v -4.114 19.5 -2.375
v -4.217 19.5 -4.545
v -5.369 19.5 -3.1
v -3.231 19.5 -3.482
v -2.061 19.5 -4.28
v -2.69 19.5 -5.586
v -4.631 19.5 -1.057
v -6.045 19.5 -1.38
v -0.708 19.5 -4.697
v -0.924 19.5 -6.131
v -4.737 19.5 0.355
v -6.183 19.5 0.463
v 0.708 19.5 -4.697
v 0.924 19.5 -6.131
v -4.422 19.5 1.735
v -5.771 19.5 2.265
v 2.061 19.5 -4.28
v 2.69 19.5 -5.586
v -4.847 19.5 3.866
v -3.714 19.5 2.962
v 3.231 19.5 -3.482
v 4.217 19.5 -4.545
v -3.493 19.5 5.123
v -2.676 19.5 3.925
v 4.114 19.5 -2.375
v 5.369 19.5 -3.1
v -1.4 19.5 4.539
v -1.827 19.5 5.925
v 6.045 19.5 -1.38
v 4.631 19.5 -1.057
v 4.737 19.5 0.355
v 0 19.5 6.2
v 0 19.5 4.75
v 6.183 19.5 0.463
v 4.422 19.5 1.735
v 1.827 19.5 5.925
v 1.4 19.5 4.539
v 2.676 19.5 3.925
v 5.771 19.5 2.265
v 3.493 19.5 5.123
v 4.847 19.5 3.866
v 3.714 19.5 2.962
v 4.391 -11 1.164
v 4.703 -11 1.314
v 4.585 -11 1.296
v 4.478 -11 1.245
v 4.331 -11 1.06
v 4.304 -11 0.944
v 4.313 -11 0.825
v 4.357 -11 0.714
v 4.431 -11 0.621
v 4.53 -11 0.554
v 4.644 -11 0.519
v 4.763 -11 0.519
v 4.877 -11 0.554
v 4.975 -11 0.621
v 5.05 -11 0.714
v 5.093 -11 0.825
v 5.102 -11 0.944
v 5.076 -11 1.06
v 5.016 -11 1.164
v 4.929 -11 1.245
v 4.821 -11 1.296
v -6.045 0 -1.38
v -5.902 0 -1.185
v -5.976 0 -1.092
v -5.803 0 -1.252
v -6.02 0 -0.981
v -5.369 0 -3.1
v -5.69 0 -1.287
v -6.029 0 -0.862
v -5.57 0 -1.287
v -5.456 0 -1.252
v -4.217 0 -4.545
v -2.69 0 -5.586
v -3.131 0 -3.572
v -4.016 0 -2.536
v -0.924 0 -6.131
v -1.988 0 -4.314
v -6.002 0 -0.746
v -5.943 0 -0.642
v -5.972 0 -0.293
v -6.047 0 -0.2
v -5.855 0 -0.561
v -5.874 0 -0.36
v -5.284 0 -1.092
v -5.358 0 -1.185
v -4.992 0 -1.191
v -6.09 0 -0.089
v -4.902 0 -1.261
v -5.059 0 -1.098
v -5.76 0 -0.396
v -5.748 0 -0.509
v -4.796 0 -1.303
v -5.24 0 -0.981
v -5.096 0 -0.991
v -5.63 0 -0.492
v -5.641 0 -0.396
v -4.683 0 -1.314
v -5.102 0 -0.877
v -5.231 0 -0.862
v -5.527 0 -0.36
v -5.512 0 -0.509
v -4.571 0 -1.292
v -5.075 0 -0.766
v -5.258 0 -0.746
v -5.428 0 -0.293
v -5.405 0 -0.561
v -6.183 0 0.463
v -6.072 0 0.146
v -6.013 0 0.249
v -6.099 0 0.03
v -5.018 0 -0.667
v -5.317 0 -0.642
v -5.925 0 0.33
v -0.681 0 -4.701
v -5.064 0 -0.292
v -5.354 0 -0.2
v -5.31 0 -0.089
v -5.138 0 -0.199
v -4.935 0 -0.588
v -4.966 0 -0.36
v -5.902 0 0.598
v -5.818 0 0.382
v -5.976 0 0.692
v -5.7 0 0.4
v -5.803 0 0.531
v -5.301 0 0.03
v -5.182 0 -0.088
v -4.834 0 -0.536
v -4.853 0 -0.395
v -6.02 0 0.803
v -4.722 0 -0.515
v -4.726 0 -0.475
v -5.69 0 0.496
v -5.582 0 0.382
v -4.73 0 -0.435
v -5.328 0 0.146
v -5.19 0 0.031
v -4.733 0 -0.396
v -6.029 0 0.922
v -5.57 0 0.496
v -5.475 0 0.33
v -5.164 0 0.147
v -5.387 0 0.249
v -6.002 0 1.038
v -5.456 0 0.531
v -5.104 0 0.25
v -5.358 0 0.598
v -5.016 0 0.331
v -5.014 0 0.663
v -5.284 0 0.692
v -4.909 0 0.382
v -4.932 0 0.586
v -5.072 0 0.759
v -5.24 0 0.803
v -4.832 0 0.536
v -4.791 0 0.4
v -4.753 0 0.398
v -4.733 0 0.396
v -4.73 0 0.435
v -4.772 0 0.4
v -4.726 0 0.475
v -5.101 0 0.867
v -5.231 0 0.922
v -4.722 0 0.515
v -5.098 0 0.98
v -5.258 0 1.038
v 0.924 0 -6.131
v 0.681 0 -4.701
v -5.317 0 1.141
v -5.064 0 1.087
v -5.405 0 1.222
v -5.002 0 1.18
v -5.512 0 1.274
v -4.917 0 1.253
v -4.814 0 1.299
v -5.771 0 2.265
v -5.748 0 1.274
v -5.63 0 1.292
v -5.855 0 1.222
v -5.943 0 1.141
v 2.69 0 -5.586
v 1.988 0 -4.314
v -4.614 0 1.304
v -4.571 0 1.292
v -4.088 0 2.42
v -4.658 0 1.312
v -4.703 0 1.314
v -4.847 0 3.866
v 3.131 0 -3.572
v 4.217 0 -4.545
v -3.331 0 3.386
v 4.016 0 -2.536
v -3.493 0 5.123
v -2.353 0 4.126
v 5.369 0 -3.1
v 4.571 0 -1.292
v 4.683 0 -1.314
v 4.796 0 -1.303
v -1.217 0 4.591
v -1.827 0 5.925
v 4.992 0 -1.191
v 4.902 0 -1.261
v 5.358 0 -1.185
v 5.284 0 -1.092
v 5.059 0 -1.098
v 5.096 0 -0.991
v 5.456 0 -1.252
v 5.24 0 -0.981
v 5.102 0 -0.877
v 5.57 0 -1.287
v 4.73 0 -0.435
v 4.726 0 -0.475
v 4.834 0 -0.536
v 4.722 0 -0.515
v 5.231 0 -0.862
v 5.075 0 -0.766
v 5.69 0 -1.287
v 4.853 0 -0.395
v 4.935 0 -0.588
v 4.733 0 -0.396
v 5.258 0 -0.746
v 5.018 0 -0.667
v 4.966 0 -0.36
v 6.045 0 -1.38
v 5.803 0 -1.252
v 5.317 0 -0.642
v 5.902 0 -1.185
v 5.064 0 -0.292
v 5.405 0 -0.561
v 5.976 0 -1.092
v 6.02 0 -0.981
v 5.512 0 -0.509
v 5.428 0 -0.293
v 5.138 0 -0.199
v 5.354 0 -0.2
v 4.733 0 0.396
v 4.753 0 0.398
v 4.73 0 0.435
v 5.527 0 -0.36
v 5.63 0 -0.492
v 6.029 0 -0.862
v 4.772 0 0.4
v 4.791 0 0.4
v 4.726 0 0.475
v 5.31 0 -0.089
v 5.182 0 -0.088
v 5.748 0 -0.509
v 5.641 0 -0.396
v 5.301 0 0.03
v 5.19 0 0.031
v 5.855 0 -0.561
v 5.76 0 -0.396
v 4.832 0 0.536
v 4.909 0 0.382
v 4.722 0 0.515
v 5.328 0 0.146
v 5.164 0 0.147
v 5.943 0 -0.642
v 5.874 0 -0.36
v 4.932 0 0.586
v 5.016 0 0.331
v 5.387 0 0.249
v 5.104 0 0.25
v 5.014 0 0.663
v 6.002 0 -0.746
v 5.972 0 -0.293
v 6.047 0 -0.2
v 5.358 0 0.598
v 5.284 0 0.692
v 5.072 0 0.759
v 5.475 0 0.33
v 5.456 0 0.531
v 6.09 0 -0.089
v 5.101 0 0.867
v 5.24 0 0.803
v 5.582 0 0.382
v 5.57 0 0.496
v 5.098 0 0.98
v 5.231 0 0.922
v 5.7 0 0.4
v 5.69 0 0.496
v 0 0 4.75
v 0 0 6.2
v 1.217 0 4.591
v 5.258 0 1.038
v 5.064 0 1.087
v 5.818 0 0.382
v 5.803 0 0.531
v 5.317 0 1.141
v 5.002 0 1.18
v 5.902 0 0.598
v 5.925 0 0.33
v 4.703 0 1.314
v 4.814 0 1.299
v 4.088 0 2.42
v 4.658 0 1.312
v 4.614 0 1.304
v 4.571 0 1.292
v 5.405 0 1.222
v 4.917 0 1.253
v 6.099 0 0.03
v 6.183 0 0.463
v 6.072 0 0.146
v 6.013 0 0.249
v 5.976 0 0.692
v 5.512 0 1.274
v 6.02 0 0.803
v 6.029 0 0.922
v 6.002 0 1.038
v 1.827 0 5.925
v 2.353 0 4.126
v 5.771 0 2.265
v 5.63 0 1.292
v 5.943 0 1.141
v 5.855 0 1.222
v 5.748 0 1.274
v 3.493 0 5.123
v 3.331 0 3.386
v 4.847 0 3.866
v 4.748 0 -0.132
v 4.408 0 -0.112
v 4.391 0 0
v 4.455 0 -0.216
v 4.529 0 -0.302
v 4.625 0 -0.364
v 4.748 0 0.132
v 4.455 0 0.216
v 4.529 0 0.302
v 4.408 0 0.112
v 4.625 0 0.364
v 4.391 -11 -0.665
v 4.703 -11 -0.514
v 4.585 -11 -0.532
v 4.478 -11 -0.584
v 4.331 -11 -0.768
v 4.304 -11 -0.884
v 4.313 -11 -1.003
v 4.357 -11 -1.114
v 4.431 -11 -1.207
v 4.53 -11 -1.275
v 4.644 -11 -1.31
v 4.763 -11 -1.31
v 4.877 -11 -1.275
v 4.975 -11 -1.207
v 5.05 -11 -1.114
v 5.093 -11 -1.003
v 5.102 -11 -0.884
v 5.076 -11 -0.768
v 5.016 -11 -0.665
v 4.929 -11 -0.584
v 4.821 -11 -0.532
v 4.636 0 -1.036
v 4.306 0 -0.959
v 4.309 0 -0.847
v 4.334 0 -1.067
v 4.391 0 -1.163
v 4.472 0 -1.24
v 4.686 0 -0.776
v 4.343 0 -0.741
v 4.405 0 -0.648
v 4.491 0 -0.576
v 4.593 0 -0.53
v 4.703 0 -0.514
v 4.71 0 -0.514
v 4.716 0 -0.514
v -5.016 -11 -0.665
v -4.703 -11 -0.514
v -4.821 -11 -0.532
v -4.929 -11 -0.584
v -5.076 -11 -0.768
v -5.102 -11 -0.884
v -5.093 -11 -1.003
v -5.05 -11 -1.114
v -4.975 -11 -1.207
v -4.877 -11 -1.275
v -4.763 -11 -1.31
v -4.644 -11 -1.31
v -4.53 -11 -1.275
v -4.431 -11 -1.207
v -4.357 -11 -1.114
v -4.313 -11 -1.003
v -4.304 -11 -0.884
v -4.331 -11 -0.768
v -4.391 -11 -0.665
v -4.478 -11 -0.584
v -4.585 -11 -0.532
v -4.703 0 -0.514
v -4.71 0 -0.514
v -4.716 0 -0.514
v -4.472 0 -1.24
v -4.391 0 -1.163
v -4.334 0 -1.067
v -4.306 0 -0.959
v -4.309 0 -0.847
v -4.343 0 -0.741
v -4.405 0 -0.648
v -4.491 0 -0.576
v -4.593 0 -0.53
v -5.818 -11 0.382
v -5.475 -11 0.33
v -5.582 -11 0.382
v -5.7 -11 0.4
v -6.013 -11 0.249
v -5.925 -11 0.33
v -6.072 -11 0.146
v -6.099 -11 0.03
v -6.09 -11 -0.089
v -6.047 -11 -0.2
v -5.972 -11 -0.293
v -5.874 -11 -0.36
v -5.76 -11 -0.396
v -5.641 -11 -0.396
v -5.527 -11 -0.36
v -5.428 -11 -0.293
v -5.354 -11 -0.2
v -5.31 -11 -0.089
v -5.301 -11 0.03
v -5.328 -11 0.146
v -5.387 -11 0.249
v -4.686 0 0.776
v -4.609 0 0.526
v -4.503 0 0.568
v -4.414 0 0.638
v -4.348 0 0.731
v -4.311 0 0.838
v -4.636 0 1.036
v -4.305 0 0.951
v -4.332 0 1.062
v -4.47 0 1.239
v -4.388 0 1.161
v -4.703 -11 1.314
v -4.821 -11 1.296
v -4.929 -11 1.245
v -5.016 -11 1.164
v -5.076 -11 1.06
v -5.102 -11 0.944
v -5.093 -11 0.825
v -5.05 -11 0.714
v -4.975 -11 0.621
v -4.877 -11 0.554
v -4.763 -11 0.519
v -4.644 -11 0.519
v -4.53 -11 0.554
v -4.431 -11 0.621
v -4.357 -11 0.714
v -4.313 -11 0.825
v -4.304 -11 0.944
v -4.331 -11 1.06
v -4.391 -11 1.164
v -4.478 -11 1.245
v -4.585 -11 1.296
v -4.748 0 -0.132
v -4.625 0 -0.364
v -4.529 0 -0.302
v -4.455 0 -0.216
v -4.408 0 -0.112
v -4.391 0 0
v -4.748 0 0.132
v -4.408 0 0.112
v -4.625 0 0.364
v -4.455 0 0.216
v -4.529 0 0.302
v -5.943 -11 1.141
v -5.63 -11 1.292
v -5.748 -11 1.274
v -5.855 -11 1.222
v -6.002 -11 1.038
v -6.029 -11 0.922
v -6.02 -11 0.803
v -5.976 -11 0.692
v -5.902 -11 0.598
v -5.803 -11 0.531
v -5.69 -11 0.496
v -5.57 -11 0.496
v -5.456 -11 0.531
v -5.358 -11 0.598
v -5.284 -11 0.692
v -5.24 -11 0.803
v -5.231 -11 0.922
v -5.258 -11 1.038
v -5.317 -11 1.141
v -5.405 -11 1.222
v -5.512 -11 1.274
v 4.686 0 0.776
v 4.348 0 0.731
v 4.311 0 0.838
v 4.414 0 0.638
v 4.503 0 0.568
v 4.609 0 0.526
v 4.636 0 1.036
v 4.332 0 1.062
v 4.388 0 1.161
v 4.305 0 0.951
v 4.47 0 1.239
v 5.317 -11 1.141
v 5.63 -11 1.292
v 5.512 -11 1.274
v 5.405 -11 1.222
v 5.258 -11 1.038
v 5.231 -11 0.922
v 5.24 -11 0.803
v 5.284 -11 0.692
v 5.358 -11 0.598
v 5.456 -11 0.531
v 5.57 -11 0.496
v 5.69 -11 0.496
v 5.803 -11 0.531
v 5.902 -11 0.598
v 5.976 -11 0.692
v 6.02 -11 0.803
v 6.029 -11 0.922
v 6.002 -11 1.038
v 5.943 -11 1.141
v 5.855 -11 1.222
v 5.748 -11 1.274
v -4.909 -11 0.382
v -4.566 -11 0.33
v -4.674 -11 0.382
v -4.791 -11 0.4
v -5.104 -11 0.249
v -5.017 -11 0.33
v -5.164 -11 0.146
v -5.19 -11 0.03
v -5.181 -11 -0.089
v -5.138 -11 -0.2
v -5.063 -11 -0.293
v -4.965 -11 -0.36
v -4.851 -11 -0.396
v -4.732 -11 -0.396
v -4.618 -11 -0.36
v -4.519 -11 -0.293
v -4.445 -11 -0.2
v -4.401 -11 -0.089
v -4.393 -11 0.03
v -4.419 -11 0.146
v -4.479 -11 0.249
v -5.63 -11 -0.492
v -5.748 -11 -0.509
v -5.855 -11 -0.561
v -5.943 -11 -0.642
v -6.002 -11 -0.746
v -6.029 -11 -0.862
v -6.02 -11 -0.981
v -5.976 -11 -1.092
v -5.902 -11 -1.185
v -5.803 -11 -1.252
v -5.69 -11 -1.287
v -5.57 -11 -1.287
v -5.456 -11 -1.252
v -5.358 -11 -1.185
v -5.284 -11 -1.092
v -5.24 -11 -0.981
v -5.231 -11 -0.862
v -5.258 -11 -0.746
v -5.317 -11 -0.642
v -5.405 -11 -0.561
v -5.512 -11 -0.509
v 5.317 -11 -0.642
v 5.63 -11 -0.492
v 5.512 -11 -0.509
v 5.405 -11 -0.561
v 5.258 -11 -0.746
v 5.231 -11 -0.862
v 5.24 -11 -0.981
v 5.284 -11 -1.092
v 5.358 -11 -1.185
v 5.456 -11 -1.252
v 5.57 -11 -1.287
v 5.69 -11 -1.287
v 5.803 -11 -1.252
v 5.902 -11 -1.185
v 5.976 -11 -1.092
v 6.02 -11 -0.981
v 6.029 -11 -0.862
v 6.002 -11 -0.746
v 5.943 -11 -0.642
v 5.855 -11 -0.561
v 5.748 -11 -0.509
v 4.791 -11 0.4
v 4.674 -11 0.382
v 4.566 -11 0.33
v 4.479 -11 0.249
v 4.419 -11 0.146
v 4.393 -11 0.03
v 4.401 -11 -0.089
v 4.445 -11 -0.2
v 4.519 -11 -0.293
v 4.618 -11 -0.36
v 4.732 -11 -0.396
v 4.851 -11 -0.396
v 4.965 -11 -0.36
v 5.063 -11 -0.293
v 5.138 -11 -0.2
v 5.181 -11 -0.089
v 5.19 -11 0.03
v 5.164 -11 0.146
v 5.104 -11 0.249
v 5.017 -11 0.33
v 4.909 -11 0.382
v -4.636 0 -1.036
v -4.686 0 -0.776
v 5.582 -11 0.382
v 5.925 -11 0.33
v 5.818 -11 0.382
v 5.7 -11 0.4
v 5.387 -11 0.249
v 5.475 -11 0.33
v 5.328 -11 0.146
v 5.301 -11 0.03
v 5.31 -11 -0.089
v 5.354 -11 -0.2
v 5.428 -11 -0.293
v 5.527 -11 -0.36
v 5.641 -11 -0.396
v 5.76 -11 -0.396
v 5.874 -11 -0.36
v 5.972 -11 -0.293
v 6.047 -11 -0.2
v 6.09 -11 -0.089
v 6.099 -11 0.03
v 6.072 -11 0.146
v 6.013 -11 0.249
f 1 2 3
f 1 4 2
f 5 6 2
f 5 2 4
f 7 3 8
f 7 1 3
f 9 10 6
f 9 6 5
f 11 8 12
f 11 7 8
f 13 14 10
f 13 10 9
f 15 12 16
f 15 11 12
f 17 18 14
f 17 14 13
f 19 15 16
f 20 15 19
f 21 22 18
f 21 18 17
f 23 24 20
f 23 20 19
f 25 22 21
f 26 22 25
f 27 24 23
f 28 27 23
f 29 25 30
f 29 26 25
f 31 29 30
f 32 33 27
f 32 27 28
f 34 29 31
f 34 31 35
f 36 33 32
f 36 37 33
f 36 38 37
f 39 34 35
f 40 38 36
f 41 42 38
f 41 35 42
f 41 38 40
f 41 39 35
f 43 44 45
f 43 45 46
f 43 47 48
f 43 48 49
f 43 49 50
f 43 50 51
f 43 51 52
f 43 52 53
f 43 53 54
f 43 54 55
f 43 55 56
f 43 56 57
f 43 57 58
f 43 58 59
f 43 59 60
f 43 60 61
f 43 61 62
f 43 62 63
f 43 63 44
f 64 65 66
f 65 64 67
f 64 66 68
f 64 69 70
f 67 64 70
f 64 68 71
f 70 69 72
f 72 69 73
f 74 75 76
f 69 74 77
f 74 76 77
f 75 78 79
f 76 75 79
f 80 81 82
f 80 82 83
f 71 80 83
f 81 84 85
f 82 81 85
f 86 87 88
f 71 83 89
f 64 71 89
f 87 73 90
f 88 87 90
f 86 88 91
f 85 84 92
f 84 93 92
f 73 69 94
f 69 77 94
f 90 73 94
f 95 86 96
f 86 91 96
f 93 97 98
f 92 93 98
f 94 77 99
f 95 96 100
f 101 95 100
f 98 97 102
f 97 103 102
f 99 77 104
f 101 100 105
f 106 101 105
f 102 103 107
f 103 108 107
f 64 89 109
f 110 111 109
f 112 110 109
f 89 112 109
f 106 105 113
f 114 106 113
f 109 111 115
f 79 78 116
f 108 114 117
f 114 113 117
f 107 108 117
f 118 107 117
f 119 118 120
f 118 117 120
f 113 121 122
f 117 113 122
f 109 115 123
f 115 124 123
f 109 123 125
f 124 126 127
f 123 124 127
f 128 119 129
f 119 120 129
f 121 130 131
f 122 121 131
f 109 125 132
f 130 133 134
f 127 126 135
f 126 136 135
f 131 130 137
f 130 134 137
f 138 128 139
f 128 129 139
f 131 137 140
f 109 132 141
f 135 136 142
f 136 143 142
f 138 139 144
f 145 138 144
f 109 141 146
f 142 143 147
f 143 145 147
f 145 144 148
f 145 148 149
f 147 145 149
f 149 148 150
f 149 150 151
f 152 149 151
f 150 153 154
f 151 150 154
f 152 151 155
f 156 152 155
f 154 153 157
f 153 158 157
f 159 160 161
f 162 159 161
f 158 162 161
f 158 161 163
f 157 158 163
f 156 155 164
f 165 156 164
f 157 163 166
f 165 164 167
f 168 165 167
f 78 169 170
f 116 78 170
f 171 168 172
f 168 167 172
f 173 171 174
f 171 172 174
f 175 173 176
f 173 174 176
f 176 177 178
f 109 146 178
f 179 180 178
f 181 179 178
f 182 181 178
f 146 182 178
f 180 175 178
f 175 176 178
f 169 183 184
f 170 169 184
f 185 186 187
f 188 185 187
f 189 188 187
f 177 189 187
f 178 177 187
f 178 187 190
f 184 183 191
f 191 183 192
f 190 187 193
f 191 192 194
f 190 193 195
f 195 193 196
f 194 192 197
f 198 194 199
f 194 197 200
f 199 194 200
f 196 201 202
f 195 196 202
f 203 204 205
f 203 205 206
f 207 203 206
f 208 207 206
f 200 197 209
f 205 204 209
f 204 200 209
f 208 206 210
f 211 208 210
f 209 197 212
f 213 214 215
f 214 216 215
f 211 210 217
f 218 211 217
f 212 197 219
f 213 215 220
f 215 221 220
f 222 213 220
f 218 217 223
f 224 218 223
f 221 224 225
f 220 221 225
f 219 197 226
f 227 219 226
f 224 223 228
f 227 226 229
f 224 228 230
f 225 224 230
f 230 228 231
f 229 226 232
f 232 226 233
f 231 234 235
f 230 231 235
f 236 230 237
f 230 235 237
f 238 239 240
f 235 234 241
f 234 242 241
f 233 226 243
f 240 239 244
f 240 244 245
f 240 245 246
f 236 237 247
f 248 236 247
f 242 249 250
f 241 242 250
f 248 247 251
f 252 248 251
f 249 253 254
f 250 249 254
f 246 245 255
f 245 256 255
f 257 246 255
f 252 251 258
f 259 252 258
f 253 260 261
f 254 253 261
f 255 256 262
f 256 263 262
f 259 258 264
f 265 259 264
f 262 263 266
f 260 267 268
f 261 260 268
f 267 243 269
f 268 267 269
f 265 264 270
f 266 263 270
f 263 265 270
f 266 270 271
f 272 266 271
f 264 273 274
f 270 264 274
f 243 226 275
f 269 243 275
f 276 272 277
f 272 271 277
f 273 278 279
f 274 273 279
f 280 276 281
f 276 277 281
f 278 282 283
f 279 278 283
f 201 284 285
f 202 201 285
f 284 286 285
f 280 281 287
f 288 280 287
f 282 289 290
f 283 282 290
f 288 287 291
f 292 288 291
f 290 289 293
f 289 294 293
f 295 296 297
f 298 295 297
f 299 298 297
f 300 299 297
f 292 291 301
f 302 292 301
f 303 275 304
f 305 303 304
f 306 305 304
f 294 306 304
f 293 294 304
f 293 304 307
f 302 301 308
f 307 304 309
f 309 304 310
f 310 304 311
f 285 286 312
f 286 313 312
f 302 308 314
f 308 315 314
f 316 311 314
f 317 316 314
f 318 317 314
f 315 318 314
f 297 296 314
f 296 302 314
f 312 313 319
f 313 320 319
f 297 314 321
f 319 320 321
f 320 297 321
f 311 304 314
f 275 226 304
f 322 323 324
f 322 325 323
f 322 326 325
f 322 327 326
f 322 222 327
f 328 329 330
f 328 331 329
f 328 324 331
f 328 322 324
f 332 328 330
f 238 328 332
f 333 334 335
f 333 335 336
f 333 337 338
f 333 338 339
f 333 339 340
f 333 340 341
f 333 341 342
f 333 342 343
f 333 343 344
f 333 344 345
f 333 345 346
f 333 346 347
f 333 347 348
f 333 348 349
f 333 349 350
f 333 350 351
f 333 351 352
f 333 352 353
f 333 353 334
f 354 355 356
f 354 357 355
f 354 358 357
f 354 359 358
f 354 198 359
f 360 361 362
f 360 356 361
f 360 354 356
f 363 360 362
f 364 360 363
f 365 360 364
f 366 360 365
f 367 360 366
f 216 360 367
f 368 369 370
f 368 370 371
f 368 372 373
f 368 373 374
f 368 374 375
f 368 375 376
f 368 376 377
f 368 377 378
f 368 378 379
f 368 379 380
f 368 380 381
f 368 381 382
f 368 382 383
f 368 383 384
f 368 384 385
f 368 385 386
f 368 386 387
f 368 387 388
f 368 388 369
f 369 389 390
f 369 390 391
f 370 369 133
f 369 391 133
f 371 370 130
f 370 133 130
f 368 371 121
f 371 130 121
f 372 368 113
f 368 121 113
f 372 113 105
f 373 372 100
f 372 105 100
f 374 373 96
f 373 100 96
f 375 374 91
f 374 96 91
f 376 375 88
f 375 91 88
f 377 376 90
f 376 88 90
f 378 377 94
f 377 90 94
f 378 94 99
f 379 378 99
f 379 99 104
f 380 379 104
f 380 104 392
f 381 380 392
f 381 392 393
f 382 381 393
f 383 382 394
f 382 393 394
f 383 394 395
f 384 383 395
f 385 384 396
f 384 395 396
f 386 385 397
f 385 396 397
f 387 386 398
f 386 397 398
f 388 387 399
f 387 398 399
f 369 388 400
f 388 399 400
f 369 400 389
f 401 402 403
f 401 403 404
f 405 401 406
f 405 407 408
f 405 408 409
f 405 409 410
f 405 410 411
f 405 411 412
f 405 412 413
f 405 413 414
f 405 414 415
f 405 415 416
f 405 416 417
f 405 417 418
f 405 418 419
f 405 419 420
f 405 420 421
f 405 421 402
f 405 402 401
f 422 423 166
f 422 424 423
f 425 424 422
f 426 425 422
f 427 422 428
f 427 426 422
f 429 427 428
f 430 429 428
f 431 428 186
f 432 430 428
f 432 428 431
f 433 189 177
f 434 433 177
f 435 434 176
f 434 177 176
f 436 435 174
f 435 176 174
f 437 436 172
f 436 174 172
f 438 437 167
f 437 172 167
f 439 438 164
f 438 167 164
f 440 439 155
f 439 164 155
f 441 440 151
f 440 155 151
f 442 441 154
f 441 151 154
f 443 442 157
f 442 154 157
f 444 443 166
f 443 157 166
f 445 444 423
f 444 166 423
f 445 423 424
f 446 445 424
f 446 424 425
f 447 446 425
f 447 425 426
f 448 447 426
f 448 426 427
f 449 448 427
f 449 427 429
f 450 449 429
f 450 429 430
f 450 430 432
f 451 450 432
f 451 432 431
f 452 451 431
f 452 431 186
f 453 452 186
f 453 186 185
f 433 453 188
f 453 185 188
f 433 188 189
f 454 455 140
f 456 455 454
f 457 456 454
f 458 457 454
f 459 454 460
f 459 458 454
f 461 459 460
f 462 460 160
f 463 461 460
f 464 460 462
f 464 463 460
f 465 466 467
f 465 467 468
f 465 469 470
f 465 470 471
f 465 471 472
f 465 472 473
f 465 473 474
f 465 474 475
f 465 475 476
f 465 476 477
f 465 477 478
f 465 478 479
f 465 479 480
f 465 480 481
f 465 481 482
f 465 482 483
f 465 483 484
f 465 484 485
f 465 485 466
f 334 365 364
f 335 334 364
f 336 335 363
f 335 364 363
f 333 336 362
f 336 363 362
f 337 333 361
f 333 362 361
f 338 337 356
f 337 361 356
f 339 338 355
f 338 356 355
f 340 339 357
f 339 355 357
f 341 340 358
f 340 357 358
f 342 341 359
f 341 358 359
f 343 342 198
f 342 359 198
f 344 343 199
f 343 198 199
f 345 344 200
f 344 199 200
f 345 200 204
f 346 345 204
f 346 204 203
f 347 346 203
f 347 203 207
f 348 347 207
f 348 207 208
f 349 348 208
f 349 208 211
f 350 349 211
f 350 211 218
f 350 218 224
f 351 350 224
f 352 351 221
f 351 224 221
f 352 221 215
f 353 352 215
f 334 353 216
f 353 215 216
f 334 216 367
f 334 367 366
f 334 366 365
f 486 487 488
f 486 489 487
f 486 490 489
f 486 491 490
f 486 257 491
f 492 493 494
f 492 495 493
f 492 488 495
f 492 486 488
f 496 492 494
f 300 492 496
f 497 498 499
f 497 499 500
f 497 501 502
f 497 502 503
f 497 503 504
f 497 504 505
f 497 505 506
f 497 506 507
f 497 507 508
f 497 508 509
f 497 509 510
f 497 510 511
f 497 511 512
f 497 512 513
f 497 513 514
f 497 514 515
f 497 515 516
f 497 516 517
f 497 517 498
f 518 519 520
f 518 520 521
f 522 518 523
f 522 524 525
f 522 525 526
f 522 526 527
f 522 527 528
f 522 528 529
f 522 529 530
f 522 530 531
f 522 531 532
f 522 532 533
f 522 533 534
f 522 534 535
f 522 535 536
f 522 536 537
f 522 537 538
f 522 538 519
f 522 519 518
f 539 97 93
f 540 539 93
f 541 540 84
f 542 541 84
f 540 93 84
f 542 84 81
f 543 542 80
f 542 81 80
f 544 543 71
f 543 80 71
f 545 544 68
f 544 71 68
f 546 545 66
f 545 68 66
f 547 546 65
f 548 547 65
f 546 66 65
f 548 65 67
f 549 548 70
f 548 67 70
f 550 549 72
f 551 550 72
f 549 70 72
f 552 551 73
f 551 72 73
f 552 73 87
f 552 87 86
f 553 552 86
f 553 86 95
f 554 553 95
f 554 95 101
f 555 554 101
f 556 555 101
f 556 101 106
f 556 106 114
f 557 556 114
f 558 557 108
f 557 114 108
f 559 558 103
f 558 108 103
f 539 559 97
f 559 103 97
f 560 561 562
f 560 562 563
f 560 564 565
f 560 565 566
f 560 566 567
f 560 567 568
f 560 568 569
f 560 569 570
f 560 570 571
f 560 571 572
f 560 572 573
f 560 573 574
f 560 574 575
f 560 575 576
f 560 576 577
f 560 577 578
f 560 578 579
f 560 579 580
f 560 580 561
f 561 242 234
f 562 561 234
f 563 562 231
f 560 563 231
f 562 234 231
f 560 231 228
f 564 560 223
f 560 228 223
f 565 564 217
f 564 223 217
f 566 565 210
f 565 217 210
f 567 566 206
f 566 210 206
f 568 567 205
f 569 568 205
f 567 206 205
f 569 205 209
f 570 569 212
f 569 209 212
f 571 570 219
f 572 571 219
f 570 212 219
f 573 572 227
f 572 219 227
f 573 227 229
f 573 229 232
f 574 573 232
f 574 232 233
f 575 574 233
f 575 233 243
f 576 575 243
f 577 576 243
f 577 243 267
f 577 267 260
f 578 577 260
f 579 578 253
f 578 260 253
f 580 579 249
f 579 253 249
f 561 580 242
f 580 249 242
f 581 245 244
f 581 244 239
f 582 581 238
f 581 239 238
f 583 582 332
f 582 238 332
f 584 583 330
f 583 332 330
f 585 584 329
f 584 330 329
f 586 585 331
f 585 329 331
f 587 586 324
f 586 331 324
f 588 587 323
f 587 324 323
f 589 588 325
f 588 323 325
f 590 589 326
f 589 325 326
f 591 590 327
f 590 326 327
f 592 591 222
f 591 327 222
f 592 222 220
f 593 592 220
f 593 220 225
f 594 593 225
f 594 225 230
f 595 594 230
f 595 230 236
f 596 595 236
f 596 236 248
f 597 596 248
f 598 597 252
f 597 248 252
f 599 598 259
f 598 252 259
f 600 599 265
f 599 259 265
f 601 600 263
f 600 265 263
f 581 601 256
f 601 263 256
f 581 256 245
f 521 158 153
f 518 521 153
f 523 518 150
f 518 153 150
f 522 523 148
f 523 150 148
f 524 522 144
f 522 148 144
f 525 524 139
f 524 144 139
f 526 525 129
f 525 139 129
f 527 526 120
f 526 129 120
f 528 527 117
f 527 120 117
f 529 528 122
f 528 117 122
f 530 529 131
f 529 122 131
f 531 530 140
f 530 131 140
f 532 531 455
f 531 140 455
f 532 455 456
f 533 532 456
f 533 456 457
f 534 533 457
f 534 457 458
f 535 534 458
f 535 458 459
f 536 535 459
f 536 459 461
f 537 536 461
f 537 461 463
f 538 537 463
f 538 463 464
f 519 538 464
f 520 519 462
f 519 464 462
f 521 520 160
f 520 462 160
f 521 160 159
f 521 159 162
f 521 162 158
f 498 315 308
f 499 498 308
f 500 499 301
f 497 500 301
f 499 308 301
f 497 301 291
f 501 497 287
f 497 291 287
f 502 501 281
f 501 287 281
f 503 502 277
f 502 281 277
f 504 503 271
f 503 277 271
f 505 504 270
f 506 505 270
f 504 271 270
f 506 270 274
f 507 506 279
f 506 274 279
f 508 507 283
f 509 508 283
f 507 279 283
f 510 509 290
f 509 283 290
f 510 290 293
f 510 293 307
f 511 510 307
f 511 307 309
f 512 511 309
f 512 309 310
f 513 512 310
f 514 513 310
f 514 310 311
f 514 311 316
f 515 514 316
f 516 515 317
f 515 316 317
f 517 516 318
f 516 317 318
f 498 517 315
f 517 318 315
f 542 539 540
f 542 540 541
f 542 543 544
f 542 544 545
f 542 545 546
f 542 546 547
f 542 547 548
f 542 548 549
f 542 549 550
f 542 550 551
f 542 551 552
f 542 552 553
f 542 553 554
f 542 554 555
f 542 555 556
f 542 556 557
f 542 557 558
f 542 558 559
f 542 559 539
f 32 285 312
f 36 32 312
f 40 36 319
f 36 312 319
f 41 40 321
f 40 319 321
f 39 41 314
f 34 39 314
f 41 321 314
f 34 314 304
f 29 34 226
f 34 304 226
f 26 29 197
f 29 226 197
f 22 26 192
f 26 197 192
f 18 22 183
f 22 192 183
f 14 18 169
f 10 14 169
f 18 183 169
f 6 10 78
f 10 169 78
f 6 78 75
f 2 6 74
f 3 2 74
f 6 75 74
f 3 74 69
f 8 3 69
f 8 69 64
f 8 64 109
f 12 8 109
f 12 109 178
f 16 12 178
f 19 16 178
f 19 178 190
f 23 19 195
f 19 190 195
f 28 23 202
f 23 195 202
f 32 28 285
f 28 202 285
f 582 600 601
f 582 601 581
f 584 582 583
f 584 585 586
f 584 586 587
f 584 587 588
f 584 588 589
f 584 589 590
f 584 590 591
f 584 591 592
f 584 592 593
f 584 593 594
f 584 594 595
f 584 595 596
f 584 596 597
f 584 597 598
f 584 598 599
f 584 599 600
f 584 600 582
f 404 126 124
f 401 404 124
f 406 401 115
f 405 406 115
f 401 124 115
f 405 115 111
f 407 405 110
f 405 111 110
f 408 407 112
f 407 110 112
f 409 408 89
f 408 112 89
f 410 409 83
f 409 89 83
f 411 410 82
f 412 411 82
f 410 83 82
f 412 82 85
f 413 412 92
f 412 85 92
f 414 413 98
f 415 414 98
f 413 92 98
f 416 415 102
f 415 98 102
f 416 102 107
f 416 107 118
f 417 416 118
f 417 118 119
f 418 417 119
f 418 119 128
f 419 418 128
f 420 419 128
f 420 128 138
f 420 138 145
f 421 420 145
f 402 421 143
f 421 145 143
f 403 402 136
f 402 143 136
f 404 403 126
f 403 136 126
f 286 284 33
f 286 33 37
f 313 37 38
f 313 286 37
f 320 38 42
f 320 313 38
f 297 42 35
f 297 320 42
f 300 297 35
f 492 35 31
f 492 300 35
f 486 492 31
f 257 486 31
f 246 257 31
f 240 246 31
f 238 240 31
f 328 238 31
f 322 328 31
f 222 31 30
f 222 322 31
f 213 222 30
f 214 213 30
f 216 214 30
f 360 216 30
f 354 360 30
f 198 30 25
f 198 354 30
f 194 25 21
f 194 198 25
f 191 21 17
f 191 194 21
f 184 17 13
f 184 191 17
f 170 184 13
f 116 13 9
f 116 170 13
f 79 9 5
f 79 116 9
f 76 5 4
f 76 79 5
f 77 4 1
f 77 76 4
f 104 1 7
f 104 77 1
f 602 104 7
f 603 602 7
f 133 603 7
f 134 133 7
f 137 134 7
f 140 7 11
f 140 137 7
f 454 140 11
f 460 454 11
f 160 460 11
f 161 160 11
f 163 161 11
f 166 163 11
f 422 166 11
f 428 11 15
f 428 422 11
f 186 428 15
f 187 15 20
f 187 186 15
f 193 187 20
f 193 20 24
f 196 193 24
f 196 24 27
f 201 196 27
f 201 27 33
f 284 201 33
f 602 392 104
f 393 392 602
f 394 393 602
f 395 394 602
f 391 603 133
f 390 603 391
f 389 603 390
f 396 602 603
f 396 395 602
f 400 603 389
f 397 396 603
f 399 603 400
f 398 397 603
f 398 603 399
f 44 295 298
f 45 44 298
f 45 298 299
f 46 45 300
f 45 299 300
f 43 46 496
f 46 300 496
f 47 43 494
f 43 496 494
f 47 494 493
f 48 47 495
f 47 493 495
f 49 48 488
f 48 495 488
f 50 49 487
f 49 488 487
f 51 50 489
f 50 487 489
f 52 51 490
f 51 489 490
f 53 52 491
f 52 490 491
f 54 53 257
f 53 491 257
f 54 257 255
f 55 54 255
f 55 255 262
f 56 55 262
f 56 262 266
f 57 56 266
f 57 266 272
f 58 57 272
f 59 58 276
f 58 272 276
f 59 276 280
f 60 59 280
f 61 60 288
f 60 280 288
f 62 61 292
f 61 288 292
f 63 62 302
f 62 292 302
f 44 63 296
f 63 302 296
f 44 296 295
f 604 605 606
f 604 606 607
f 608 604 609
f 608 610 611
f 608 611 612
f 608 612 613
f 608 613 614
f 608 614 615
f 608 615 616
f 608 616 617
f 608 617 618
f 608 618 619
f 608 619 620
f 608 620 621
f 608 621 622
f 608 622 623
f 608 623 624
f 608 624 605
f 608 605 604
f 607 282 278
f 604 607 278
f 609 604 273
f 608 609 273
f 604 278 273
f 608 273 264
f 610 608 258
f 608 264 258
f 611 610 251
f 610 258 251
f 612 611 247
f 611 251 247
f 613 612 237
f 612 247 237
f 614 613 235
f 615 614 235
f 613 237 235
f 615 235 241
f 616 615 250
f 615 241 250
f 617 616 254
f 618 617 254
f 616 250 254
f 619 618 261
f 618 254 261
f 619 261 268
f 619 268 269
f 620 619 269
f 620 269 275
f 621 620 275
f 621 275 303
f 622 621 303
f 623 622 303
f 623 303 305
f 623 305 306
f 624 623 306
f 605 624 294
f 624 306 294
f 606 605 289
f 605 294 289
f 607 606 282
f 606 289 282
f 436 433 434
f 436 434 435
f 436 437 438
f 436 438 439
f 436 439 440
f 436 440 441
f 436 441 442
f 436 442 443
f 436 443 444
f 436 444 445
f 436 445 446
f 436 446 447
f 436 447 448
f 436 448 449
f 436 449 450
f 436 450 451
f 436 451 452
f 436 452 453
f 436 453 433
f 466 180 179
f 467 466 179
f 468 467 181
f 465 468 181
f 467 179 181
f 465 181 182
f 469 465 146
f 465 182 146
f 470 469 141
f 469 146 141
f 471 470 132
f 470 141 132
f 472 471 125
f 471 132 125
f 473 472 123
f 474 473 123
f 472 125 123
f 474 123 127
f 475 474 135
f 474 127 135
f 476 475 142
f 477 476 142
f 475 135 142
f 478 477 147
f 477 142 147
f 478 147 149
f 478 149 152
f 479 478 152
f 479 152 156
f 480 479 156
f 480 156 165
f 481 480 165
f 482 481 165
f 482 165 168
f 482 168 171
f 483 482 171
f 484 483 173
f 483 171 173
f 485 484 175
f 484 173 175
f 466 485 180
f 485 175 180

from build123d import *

# Parameters (mm, degrees)
SKETCH1_R               = 6.2
BOSS_EXTRUDE1_DEPTH     = 19.5
SKETCH2_R               = 2
BOSS_EXTRUDE2_DEPTH     = 2.8
SKETCH3_R               = 0.4
BOSS_EXTRUDE4_DEPTH     = 3.5
CUT_EXTRUDE1_START      = -0.2
SKETCH4_R               = 4.75
SKETCH4_R_2             = 2
CUT_EXTRUDE1_DEPTH      = 0.2
SKETCH5_R               = 0.4
BOSS_EXTRUDE5_DEPTH     = 11
CUT_EXTRUDE3_DEPTH      = 32.543145056
CUT_EXTRUDE3_DEPTH_BACK = 19.3
SKETCH6_R               = 4.75


with BuildPart() as part:
    # Sketch1 → Boss-Extrude1 (new body)
    with BuildSketch(Plane(origin=(0, 0, 0), x_dir=(1, 0, 0), z_dir=(0, 1, 0))):
        with Locations(Location((0, 0, 0), (0, 0, 270))):
            Circle(SKETCH1_R)
    extrude(amount=BOSS_EXTRUDE1_DEPTH)

    # Sketch2 → Boss-Extrude2 (add)
    with BuildSketch(Plane(origin=(0, 19.5, 0), x_dir=(1, 0, 0), z_dir=(0, 1, 0))):
        with Locations(Location((0, 0, 0), (0, 0, 270))):
            Circle(SKETCH2_R)
    extrude(amount=BOSS_EXTRUDE2_DEPTH)

    # Sketch3 → Boss-Extrude4 (add)
    with BuildSketch(Plane(origin=(0, 22.3, 0), x_dir=(1, 0, 0), z_dir=(0, 1, 0))):
        with Locations(Location((-0.41145274, -0.237271907, 0), (0, 0, 270))):
            Circle(SKETCH3_R)
        with Locations(Location((-0.09128588, 1.346231062, 0), (0, 0, 270))):
            Circle(SKETCH3_R)
        with Locations(Location((0.706061251, 1.146478436, 0), (0, 0, 270))):
            Circle(SKETCH3_R)
        with Locations(Location((1.233716983, 0.516206281, 0), (0, 0, 270))):
            Circle(SKETCH3_R)
        with Locations(Location((1.29013476, -0.30384286, 0), (0, 0, 270))):
            Circle(SKETCH3_R)
        with Locations(Location((0.853764908, -1.000438089, 0), (0, 0, 270))):
            Circle(SKETCH3_R)
        with Locations(Location((0.09128588, -1.307503705, 0), (0, 0, 270))):
            Circle(SKETCH3_R)
        with Locations(Location((-0.706061251, -1.107751078, 0), (0, 0, 270))):
            Circle(SKETCH3_R)
        with Locations(Location((-1.233716983, -0.477478923, 0), (0, 0, 270))):
            Circle(SKETCH3_R)
        with Locations(Location((-1.29013476, 0.342570218, 0), (0, 0, 270))):
            Circle(SKETCH3_R)
        with Locations(Location((-0.853764908, 1.039165447, 0), (0, 0, 270))):
            Circle(SKETCH3_R)
        with Locations(Location((0, 0.516206281, 0), (0, 0, 270))):
            Circle(SKETCH3_R)
        with Locations(Location((0.441742202, -0.237271907, 0), (0, 0, 270))):
            Circle(SKETCH3_R)
    extrude(amount=BOSS_EXTRUDE4_DEPTH)

    # Sketch4 → Cut-Extrude1 (cut)
    with BuildSketch(Plane(origin=(0, 19.5, 0), x_dir=(1, 0, 0), z_dir=(0, 1, 0)).offset(CUT_EXTRUDE1_START)):
        with Locations(Location((0, 0, 0), (0, 0, 270))):
            Circle(SKETCH4_R)
        with Locations(Location((0, 0, 0), (0, 0, 270))):
            Circle(SKETCH4_R_2, mode=Mode.SUBTRACT)
    extrude(amount=CUT_EXTRUDE1_DEPTH, mode=Mode.SUBTRACT)

    # Sketch5 → Boss-Extrude5 (add)
    with BuildSketch(Plane.XZ):
        with Locations(Location((-5.700120356, 0, 0), (0, 0, 90))):
            Circle(SKETCH5_R)
        with Locations(Location((-5.629942415, 0.891695278, 0), (0, 0, 90))):
            Circle(SKETCH5_R)
        with Locations(Location((-4.791405516, 0, 0), (0, 0, 90))):
            Circle(SKETCH5_R)
        with Locations(Location((-4.703373902, 0.914243273, 0), (0, 0, 90))):
            Circle(SKETCH5_R)
        with Locations(Location((-4.703373902, -0.914243273, 0), (0, 0, 90))):
            Circle(SKETCH5_R)
        with Locations(Location((-5.629942415, -0.891695278, 0), (0, 0, 90))):
            Circle(SKETCH5_R)
        with Locations(Location((5.629942415, -0.891695278, 0), (0, 0, 90))):
            Circle(SKETCH5_R)
        with Locations(Location((4.703373902, -0.914243273, 0), (0, 0, 90))):
            Circle(SKETCH5_R)
        with Locations(Location((4.703373902, 0.914243273, 0), (0, 0, 90))):
            Circle(SKETCH5_R)
        with Locations(Location((4.791405516, 0, 0), (0, 0, 90))):
            Circle(SKETCH5_R)
        with Locations(Location((5.629942415, 0.891695278, 0), (0, 0, 90))):
            Circle(SKETCH5_R)
        with Locations(Location((5.700120356, 0, 0), (0, 0, 90))):
            Circle(SKETCH5_R)
    extrude(amount=BOSS_EXTRUDE5_DEPTH)

    # Sketch6 → Cut-Extrude3 (cut, two sides: drawn at the far end of the back side and taken through both)
    with BuildSketch(Plane(origin=(0, 19.3, 0), x_dir=(1, 0, 0), z_dir=(0, 1, 0)).offset(-CUT_EXTRUDE3_DEPTH_BACK)):
        with Locations(Location((0, 0, 0), (0, 0, 270))):
            Circle(SKETCH6_R)
    extrude(amount=CUT_EXTRUDE3_DEPTH + CUT_EXTRUDE3_DEPTH_BACK, mode=Mode.SUBTRACT)


solid = part.part
